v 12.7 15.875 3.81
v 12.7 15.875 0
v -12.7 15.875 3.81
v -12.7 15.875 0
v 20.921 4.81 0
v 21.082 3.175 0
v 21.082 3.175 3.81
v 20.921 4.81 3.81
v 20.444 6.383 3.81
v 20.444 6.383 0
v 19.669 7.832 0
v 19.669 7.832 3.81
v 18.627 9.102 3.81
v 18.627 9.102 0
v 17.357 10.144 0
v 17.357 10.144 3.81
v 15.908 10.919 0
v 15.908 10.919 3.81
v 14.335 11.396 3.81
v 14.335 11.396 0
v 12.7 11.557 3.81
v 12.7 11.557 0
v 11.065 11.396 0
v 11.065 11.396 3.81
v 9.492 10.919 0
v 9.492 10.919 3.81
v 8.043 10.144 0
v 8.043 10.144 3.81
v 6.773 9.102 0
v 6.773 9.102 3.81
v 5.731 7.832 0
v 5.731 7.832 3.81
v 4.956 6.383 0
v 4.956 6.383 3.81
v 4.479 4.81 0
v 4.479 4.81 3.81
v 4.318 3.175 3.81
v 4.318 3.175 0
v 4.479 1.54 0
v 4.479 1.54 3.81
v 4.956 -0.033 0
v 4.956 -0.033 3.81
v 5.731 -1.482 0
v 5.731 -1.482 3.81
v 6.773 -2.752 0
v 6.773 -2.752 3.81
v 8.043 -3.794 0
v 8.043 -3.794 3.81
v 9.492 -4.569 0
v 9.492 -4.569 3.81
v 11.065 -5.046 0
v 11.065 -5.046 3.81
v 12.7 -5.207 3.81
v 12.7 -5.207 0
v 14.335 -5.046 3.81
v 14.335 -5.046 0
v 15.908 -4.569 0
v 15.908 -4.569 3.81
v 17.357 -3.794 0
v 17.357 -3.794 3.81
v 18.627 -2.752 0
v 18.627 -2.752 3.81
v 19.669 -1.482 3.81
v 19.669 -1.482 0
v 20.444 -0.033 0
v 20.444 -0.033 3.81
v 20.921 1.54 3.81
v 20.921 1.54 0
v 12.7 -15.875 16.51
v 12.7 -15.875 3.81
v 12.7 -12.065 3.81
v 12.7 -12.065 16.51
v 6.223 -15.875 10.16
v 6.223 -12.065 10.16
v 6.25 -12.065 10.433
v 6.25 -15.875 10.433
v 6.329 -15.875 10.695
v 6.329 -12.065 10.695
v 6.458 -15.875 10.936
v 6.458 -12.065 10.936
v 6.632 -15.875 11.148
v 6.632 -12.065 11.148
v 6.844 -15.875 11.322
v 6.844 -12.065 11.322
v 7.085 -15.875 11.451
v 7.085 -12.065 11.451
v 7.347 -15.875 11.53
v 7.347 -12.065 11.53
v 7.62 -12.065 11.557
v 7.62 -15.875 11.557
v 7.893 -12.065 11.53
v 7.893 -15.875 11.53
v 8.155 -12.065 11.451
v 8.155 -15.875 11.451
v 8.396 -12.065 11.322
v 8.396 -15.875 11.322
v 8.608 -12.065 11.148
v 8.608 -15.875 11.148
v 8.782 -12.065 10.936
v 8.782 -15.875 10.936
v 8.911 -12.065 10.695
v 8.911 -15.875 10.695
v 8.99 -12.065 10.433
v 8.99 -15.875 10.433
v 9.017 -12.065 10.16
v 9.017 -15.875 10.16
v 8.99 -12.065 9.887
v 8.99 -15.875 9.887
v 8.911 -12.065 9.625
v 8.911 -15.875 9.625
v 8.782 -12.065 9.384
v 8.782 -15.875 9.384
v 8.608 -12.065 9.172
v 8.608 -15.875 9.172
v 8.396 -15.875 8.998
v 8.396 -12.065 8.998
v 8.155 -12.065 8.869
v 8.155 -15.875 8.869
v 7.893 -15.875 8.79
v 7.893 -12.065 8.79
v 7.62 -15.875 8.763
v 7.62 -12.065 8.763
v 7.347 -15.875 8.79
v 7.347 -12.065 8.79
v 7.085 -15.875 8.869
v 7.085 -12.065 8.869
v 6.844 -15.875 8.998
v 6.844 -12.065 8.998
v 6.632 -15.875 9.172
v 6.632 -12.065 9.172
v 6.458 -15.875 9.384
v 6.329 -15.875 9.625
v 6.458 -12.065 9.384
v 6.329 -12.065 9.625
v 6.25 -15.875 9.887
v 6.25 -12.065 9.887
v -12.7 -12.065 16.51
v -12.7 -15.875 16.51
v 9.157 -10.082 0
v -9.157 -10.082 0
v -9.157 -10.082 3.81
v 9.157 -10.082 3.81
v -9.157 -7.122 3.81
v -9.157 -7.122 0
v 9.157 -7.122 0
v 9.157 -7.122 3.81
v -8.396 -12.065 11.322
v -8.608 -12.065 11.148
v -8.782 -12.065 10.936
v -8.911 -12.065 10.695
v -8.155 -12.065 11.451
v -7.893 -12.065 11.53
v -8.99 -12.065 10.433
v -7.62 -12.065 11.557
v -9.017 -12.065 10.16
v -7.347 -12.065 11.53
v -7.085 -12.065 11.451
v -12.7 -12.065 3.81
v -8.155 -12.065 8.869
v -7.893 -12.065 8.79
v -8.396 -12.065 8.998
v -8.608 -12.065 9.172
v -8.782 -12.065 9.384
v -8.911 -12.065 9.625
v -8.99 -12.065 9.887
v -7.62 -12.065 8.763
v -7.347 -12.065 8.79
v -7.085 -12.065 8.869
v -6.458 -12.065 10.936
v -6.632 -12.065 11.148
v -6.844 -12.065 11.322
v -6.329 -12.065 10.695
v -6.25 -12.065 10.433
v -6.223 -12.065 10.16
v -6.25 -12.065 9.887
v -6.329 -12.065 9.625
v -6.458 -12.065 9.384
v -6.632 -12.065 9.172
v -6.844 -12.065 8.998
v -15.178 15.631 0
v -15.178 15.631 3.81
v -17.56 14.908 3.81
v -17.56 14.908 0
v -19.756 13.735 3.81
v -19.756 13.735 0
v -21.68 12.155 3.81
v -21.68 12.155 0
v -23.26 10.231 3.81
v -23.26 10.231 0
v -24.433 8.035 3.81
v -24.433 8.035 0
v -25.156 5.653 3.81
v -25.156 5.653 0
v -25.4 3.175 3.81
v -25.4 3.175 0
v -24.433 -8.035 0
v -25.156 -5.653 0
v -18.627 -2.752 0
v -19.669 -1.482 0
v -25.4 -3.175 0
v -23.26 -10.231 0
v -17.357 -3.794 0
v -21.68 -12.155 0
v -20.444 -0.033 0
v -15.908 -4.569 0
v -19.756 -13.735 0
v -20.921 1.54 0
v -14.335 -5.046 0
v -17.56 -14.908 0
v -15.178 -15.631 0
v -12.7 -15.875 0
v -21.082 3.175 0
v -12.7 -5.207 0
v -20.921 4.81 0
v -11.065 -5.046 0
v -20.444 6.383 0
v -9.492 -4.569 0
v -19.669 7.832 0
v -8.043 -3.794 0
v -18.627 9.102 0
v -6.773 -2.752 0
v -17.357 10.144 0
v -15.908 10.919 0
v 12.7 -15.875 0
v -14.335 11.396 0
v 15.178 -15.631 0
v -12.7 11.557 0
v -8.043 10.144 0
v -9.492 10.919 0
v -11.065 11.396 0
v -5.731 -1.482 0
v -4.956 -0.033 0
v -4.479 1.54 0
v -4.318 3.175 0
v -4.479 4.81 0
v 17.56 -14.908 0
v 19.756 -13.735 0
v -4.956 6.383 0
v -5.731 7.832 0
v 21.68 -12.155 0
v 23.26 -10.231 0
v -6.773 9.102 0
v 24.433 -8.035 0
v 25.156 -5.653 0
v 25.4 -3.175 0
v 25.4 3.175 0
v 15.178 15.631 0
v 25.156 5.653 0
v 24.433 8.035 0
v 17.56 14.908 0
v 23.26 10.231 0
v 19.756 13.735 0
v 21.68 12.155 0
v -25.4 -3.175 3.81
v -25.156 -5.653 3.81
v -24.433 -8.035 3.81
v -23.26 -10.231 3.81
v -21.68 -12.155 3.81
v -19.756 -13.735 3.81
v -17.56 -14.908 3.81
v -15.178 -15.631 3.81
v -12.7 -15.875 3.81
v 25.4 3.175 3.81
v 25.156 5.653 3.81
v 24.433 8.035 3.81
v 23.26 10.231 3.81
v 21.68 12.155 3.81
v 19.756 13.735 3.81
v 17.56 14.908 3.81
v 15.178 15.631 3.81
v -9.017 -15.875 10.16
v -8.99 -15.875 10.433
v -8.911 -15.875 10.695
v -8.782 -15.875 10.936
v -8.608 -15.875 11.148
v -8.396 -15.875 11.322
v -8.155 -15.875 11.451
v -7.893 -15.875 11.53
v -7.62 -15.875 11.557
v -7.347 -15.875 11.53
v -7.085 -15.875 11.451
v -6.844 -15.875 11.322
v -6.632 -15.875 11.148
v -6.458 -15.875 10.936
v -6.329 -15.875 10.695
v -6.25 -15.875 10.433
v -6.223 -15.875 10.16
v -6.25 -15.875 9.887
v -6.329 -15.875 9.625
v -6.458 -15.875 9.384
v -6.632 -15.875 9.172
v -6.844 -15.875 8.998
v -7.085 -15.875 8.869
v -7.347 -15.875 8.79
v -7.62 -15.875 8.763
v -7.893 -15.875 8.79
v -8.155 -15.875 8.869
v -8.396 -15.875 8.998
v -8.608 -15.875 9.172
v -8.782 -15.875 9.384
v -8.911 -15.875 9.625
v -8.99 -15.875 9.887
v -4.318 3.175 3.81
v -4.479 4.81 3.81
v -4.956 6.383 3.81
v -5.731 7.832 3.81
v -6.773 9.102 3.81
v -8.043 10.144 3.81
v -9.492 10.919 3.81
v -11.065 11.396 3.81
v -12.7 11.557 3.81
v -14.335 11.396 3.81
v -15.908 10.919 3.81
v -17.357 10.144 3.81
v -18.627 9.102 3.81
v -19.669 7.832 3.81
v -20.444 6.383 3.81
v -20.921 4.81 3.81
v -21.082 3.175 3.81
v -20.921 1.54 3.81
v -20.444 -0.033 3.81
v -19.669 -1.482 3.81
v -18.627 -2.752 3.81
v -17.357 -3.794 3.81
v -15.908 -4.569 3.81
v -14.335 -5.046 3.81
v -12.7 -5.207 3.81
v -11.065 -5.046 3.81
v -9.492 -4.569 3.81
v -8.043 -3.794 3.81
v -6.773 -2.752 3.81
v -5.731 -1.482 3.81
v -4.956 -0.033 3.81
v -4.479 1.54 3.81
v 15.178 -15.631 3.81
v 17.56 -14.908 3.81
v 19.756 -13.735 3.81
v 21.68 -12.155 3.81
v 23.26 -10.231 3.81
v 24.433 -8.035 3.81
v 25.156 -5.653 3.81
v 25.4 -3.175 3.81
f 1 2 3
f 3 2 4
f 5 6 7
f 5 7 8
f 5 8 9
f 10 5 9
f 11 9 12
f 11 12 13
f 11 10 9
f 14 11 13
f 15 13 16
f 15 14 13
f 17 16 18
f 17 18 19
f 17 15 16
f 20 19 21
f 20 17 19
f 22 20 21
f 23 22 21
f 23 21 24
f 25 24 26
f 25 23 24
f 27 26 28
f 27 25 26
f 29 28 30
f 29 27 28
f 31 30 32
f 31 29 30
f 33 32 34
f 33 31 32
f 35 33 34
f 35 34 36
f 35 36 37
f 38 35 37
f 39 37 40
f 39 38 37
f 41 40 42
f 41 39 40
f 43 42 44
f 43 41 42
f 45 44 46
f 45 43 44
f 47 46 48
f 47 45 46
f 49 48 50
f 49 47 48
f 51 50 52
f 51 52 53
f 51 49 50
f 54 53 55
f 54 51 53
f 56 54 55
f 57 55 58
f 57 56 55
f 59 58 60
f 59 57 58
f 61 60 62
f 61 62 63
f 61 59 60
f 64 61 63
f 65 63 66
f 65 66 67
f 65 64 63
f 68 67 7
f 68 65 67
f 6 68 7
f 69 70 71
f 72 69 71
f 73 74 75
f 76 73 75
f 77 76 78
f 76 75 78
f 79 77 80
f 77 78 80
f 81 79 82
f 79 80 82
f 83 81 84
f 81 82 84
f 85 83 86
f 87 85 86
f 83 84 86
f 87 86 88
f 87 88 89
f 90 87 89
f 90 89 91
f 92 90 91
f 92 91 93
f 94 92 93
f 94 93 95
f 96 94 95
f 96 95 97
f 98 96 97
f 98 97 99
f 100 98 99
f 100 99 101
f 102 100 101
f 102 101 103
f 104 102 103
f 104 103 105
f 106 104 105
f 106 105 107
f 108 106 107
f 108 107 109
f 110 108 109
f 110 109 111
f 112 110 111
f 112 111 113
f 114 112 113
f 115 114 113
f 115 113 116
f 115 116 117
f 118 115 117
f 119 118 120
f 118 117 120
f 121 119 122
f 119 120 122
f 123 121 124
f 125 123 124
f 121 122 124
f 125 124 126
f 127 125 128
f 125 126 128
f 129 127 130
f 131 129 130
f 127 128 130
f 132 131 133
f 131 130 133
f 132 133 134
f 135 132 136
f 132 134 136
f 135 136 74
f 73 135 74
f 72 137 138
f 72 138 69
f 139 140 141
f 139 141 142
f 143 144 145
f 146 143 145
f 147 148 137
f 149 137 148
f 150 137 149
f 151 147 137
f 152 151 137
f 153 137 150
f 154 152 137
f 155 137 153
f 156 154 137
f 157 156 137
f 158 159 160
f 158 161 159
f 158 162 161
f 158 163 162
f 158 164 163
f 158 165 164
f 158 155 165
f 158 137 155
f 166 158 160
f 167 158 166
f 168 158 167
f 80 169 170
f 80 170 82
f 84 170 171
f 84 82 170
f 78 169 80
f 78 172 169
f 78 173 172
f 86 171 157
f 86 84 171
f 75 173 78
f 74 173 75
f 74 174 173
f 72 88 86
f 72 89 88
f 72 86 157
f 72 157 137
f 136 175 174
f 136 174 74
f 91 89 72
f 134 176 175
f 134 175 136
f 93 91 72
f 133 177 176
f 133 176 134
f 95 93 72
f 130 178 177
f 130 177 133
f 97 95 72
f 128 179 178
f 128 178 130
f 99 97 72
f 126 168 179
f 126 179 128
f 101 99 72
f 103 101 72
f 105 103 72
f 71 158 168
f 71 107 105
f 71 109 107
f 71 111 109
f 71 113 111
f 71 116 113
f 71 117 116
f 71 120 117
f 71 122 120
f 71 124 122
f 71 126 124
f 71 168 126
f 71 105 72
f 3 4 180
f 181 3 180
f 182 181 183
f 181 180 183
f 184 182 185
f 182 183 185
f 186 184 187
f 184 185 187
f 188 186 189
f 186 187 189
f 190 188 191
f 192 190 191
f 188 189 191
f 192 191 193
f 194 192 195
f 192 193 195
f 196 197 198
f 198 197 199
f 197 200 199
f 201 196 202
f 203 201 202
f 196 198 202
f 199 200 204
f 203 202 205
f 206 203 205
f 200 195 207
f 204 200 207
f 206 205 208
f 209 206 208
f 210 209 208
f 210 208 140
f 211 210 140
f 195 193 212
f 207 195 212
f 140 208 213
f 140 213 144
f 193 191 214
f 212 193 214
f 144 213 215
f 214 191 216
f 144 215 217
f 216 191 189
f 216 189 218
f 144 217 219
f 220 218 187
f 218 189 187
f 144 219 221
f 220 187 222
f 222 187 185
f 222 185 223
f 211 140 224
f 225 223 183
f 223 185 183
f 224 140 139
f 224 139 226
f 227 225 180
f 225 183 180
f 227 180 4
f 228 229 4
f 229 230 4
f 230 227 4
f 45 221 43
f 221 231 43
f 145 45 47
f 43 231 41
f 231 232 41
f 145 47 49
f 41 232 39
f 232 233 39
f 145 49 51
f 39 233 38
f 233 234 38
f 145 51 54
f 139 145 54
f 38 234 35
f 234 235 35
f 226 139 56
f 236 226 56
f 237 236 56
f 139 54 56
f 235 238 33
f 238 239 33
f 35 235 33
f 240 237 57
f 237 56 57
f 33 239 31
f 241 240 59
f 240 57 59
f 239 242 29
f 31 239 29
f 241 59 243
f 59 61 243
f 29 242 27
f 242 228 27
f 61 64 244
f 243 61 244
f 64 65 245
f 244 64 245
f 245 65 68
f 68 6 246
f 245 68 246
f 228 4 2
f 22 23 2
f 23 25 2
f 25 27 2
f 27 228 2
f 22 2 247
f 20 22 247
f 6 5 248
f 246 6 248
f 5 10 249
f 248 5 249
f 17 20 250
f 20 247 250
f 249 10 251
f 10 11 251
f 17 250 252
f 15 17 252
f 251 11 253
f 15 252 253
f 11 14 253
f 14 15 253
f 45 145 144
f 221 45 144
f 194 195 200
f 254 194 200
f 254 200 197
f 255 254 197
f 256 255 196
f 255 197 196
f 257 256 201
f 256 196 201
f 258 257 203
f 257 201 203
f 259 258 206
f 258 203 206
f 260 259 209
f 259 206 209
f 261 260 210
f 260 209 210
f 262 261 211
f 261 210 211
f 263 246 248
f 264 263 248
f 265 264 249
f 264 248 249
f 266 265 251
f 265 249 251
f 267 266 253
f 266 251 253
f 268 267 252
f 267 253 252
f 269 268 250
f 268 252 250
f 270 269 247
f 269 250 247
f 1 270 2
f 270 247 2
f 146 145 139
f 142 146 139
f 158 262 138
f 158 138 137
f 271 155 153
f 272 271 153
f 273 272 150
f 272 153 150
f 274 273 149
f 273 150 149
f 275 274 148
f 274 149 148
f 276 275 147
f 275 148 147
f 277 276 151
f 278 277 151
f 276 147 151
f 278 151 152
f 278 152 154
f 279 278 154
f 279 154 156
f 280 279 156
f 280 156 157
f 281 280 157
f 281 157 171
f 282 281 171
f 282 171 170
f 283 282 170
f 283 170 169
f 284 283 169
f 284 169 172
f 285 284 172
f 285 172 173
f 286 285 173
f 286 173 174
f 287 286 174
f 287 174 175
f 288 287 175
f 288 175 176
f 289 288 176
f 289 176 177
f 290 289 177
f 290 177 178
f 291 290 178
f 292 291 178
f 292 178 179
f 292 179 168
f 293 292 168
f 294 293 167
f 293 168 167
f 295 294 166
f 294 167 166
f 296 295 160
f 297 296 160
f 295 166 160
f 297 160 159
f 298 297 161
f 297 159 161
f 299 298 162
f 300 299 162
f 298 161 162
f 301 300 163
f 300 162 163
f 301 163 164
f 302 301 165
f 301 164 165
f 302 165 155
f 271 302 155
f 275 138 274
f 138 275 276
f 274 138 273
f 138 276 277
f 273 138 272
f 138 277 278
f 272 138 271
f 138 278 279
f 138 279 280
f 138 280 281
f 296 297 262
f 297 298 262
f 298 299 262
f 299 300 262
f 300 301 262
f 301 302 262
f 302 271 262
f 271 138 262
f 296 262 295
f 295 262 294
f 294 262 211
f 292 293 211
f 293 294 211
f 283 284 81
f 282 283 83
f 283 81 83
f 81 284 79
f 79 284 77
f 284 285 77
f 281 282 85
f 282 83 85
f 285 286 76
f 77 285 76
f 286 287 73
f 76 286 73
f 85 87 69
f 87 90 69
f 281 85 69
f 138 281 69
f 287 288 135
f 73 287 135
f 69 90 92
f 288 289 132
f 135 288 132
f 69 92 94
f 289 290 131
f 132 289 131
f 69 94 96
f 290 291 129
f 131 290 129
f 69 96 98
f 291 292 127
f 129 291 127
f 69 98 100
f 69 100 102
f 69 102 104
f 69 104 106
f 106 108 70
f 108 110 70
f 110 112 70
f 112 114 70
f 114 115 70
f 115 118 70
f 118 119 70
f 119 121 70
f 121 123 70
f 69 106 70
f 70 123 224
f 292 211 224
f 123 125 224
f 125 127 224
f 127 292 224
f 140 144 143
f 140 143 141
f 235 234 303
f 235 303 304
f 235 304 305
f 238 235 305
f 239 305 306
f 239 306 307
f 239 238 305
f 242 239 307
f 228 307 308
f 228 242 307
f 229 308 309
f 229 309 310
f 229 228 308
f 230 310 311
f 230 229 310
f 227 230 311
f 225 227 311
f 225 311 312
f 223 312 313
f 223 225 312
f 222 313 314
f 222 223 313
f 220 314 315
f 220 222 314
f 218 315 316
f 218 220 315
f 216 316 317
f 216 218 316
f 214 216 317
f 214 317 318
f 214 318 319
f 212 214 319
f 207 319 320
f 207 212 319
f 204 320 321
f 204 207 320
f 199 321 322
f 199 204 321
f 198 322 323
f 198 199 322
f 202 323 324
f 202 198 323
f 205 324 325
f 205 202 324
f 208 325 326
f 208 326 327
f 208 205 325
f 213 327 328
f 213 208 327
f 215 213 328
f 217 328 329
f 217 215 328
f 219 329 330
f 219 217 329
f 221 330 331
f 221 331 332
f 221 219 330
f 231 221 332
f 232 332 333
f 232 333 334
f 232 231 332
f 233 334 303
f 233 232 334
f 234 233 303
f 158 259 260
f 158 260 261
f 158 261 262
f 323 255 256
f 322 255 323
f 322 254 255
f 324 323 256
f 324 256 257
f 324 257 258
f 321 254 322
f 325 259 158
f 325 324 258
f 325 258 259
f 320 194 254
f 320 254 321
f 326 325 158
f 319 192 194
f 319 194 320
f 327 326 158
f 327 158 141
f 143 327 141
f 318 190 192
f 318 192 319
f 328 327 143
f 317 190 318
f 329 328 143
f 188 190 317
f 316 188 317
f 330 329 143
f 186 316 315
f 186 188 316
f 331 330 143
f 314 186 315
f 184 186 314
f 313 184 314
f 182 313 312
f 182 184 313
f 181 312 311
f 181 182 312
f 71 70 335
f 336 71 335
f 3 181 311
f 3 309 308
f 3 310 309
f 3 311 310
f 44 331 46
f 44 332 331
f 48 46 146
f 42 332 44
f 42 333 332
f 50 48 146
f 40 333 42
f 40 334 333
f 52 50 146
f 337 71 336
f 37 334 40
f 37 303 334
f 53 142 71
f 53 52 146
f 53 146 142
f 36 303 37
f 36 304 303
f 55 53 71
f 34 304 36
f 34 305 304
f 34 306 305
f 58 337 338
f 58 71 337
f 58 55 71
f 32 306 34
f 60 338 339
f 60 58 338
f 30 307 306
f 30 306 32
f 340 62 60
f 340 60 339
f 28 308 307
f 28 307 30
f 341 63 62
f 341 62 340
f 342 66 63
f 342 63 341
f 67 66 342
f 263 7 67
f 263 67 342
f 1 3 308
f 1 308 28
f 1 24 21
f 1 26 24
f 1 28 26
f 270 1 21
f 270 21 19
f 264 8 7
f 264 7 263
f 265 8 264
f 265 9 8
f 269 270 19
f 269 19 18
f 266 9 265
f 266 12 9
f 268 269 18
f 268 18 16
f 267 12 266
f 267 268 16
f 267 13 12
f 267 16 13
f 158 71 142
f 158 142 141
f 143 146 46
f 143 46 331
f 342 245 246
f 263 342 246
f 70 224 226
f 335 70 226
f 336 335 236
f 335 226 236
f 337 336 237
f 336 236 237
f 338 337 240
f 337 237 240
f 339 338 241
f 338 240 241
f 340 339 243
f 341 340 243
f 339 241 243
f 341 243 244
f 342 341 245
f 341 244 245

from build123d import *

# Parameters (mm, degrees)
F0_R     = 8.382
F1_DEPTH = 3.81
F2_W     = 25.4
F2_H     = 3.81
F3_DEPTH = 12.7
F4_R     = 1.397
F5_DEPTH = 25.4
F6_W     = 18.314426
F6_H     = 2.959909
F7_DEPTH = 25.4


with BuildPart() as f1:
    # F0 (on Top) → F1 (new body)
    with BuildSketch(Plane.XY):
        with BuildLine():
            ThreePointArc((25.4, 3.175), (21.680256, 12.155256), (12.7, 15.875))
            Line((12.7, 15.875), (-12.7, 15.875))
            ThreePointArc((-12.7, 15.875), (-21.680256, 12.155256), (-25.4, 3.175))
            Line((-25.4, 3.175), (-25.4, -3.175))
            ThreePointArc((-25.4, -3.175), (-21.680256, -12.155256), (-12.7, -15.875))
            Line((-12.7, -15.875), (12.7, -15.875))
            ThreePointArc((12.7, -15.875), (21.680256, -12.155256), (25.4, -3.175))
            Line((25.4, -3.175), (25.4, 3.175))
        make_face()
        with Locations((-12.7, 3.175)):
            Circle(F0_R, mode=Mode.SUBTRACT)
        with Locations((12.7, 3.175)):
            Circle(F0_R, mode=Mode.SUBTRACT)
    extrude(amount=F1_DEPTH)

    # F2 (on face) → F3 (join)
    with BuildSketch(Plane.XY.offset(3.81)):
        with Locations((0, -13.97)):
            Rectangle(F2_W, F2_H)
    extrude(amount=F3_DEPTH)

    # F4 (on face) → F5 (cut)
    with BuildSketch(Plane(origin=(0, -12.065, 0), x_dir=(-1, 0, 0), z_dir=(0, 1, 0))):
        with Locations((-7.62, 10.16)):
            Circle(F4_R)
        with Locations((7.62, 10.16)):
            Circle(F4_R)
    extrude(amount=-F5_DEPTH, mode=Mode.SUBTRACT)

    # F6 (on face) → F7 (cut)
    with BuildSketch(Plane(origin=(0, 0, 0), x_dir=(1, 0, 0), z_dir=(0, 0, -1))):
        with Locations((0, 8.60223)):
            Rectangle(F6_W, F6_H)
    extrude(amount=-F7_DEPTH, mode=Mode.SUBTRACT)


solid = f1.part
